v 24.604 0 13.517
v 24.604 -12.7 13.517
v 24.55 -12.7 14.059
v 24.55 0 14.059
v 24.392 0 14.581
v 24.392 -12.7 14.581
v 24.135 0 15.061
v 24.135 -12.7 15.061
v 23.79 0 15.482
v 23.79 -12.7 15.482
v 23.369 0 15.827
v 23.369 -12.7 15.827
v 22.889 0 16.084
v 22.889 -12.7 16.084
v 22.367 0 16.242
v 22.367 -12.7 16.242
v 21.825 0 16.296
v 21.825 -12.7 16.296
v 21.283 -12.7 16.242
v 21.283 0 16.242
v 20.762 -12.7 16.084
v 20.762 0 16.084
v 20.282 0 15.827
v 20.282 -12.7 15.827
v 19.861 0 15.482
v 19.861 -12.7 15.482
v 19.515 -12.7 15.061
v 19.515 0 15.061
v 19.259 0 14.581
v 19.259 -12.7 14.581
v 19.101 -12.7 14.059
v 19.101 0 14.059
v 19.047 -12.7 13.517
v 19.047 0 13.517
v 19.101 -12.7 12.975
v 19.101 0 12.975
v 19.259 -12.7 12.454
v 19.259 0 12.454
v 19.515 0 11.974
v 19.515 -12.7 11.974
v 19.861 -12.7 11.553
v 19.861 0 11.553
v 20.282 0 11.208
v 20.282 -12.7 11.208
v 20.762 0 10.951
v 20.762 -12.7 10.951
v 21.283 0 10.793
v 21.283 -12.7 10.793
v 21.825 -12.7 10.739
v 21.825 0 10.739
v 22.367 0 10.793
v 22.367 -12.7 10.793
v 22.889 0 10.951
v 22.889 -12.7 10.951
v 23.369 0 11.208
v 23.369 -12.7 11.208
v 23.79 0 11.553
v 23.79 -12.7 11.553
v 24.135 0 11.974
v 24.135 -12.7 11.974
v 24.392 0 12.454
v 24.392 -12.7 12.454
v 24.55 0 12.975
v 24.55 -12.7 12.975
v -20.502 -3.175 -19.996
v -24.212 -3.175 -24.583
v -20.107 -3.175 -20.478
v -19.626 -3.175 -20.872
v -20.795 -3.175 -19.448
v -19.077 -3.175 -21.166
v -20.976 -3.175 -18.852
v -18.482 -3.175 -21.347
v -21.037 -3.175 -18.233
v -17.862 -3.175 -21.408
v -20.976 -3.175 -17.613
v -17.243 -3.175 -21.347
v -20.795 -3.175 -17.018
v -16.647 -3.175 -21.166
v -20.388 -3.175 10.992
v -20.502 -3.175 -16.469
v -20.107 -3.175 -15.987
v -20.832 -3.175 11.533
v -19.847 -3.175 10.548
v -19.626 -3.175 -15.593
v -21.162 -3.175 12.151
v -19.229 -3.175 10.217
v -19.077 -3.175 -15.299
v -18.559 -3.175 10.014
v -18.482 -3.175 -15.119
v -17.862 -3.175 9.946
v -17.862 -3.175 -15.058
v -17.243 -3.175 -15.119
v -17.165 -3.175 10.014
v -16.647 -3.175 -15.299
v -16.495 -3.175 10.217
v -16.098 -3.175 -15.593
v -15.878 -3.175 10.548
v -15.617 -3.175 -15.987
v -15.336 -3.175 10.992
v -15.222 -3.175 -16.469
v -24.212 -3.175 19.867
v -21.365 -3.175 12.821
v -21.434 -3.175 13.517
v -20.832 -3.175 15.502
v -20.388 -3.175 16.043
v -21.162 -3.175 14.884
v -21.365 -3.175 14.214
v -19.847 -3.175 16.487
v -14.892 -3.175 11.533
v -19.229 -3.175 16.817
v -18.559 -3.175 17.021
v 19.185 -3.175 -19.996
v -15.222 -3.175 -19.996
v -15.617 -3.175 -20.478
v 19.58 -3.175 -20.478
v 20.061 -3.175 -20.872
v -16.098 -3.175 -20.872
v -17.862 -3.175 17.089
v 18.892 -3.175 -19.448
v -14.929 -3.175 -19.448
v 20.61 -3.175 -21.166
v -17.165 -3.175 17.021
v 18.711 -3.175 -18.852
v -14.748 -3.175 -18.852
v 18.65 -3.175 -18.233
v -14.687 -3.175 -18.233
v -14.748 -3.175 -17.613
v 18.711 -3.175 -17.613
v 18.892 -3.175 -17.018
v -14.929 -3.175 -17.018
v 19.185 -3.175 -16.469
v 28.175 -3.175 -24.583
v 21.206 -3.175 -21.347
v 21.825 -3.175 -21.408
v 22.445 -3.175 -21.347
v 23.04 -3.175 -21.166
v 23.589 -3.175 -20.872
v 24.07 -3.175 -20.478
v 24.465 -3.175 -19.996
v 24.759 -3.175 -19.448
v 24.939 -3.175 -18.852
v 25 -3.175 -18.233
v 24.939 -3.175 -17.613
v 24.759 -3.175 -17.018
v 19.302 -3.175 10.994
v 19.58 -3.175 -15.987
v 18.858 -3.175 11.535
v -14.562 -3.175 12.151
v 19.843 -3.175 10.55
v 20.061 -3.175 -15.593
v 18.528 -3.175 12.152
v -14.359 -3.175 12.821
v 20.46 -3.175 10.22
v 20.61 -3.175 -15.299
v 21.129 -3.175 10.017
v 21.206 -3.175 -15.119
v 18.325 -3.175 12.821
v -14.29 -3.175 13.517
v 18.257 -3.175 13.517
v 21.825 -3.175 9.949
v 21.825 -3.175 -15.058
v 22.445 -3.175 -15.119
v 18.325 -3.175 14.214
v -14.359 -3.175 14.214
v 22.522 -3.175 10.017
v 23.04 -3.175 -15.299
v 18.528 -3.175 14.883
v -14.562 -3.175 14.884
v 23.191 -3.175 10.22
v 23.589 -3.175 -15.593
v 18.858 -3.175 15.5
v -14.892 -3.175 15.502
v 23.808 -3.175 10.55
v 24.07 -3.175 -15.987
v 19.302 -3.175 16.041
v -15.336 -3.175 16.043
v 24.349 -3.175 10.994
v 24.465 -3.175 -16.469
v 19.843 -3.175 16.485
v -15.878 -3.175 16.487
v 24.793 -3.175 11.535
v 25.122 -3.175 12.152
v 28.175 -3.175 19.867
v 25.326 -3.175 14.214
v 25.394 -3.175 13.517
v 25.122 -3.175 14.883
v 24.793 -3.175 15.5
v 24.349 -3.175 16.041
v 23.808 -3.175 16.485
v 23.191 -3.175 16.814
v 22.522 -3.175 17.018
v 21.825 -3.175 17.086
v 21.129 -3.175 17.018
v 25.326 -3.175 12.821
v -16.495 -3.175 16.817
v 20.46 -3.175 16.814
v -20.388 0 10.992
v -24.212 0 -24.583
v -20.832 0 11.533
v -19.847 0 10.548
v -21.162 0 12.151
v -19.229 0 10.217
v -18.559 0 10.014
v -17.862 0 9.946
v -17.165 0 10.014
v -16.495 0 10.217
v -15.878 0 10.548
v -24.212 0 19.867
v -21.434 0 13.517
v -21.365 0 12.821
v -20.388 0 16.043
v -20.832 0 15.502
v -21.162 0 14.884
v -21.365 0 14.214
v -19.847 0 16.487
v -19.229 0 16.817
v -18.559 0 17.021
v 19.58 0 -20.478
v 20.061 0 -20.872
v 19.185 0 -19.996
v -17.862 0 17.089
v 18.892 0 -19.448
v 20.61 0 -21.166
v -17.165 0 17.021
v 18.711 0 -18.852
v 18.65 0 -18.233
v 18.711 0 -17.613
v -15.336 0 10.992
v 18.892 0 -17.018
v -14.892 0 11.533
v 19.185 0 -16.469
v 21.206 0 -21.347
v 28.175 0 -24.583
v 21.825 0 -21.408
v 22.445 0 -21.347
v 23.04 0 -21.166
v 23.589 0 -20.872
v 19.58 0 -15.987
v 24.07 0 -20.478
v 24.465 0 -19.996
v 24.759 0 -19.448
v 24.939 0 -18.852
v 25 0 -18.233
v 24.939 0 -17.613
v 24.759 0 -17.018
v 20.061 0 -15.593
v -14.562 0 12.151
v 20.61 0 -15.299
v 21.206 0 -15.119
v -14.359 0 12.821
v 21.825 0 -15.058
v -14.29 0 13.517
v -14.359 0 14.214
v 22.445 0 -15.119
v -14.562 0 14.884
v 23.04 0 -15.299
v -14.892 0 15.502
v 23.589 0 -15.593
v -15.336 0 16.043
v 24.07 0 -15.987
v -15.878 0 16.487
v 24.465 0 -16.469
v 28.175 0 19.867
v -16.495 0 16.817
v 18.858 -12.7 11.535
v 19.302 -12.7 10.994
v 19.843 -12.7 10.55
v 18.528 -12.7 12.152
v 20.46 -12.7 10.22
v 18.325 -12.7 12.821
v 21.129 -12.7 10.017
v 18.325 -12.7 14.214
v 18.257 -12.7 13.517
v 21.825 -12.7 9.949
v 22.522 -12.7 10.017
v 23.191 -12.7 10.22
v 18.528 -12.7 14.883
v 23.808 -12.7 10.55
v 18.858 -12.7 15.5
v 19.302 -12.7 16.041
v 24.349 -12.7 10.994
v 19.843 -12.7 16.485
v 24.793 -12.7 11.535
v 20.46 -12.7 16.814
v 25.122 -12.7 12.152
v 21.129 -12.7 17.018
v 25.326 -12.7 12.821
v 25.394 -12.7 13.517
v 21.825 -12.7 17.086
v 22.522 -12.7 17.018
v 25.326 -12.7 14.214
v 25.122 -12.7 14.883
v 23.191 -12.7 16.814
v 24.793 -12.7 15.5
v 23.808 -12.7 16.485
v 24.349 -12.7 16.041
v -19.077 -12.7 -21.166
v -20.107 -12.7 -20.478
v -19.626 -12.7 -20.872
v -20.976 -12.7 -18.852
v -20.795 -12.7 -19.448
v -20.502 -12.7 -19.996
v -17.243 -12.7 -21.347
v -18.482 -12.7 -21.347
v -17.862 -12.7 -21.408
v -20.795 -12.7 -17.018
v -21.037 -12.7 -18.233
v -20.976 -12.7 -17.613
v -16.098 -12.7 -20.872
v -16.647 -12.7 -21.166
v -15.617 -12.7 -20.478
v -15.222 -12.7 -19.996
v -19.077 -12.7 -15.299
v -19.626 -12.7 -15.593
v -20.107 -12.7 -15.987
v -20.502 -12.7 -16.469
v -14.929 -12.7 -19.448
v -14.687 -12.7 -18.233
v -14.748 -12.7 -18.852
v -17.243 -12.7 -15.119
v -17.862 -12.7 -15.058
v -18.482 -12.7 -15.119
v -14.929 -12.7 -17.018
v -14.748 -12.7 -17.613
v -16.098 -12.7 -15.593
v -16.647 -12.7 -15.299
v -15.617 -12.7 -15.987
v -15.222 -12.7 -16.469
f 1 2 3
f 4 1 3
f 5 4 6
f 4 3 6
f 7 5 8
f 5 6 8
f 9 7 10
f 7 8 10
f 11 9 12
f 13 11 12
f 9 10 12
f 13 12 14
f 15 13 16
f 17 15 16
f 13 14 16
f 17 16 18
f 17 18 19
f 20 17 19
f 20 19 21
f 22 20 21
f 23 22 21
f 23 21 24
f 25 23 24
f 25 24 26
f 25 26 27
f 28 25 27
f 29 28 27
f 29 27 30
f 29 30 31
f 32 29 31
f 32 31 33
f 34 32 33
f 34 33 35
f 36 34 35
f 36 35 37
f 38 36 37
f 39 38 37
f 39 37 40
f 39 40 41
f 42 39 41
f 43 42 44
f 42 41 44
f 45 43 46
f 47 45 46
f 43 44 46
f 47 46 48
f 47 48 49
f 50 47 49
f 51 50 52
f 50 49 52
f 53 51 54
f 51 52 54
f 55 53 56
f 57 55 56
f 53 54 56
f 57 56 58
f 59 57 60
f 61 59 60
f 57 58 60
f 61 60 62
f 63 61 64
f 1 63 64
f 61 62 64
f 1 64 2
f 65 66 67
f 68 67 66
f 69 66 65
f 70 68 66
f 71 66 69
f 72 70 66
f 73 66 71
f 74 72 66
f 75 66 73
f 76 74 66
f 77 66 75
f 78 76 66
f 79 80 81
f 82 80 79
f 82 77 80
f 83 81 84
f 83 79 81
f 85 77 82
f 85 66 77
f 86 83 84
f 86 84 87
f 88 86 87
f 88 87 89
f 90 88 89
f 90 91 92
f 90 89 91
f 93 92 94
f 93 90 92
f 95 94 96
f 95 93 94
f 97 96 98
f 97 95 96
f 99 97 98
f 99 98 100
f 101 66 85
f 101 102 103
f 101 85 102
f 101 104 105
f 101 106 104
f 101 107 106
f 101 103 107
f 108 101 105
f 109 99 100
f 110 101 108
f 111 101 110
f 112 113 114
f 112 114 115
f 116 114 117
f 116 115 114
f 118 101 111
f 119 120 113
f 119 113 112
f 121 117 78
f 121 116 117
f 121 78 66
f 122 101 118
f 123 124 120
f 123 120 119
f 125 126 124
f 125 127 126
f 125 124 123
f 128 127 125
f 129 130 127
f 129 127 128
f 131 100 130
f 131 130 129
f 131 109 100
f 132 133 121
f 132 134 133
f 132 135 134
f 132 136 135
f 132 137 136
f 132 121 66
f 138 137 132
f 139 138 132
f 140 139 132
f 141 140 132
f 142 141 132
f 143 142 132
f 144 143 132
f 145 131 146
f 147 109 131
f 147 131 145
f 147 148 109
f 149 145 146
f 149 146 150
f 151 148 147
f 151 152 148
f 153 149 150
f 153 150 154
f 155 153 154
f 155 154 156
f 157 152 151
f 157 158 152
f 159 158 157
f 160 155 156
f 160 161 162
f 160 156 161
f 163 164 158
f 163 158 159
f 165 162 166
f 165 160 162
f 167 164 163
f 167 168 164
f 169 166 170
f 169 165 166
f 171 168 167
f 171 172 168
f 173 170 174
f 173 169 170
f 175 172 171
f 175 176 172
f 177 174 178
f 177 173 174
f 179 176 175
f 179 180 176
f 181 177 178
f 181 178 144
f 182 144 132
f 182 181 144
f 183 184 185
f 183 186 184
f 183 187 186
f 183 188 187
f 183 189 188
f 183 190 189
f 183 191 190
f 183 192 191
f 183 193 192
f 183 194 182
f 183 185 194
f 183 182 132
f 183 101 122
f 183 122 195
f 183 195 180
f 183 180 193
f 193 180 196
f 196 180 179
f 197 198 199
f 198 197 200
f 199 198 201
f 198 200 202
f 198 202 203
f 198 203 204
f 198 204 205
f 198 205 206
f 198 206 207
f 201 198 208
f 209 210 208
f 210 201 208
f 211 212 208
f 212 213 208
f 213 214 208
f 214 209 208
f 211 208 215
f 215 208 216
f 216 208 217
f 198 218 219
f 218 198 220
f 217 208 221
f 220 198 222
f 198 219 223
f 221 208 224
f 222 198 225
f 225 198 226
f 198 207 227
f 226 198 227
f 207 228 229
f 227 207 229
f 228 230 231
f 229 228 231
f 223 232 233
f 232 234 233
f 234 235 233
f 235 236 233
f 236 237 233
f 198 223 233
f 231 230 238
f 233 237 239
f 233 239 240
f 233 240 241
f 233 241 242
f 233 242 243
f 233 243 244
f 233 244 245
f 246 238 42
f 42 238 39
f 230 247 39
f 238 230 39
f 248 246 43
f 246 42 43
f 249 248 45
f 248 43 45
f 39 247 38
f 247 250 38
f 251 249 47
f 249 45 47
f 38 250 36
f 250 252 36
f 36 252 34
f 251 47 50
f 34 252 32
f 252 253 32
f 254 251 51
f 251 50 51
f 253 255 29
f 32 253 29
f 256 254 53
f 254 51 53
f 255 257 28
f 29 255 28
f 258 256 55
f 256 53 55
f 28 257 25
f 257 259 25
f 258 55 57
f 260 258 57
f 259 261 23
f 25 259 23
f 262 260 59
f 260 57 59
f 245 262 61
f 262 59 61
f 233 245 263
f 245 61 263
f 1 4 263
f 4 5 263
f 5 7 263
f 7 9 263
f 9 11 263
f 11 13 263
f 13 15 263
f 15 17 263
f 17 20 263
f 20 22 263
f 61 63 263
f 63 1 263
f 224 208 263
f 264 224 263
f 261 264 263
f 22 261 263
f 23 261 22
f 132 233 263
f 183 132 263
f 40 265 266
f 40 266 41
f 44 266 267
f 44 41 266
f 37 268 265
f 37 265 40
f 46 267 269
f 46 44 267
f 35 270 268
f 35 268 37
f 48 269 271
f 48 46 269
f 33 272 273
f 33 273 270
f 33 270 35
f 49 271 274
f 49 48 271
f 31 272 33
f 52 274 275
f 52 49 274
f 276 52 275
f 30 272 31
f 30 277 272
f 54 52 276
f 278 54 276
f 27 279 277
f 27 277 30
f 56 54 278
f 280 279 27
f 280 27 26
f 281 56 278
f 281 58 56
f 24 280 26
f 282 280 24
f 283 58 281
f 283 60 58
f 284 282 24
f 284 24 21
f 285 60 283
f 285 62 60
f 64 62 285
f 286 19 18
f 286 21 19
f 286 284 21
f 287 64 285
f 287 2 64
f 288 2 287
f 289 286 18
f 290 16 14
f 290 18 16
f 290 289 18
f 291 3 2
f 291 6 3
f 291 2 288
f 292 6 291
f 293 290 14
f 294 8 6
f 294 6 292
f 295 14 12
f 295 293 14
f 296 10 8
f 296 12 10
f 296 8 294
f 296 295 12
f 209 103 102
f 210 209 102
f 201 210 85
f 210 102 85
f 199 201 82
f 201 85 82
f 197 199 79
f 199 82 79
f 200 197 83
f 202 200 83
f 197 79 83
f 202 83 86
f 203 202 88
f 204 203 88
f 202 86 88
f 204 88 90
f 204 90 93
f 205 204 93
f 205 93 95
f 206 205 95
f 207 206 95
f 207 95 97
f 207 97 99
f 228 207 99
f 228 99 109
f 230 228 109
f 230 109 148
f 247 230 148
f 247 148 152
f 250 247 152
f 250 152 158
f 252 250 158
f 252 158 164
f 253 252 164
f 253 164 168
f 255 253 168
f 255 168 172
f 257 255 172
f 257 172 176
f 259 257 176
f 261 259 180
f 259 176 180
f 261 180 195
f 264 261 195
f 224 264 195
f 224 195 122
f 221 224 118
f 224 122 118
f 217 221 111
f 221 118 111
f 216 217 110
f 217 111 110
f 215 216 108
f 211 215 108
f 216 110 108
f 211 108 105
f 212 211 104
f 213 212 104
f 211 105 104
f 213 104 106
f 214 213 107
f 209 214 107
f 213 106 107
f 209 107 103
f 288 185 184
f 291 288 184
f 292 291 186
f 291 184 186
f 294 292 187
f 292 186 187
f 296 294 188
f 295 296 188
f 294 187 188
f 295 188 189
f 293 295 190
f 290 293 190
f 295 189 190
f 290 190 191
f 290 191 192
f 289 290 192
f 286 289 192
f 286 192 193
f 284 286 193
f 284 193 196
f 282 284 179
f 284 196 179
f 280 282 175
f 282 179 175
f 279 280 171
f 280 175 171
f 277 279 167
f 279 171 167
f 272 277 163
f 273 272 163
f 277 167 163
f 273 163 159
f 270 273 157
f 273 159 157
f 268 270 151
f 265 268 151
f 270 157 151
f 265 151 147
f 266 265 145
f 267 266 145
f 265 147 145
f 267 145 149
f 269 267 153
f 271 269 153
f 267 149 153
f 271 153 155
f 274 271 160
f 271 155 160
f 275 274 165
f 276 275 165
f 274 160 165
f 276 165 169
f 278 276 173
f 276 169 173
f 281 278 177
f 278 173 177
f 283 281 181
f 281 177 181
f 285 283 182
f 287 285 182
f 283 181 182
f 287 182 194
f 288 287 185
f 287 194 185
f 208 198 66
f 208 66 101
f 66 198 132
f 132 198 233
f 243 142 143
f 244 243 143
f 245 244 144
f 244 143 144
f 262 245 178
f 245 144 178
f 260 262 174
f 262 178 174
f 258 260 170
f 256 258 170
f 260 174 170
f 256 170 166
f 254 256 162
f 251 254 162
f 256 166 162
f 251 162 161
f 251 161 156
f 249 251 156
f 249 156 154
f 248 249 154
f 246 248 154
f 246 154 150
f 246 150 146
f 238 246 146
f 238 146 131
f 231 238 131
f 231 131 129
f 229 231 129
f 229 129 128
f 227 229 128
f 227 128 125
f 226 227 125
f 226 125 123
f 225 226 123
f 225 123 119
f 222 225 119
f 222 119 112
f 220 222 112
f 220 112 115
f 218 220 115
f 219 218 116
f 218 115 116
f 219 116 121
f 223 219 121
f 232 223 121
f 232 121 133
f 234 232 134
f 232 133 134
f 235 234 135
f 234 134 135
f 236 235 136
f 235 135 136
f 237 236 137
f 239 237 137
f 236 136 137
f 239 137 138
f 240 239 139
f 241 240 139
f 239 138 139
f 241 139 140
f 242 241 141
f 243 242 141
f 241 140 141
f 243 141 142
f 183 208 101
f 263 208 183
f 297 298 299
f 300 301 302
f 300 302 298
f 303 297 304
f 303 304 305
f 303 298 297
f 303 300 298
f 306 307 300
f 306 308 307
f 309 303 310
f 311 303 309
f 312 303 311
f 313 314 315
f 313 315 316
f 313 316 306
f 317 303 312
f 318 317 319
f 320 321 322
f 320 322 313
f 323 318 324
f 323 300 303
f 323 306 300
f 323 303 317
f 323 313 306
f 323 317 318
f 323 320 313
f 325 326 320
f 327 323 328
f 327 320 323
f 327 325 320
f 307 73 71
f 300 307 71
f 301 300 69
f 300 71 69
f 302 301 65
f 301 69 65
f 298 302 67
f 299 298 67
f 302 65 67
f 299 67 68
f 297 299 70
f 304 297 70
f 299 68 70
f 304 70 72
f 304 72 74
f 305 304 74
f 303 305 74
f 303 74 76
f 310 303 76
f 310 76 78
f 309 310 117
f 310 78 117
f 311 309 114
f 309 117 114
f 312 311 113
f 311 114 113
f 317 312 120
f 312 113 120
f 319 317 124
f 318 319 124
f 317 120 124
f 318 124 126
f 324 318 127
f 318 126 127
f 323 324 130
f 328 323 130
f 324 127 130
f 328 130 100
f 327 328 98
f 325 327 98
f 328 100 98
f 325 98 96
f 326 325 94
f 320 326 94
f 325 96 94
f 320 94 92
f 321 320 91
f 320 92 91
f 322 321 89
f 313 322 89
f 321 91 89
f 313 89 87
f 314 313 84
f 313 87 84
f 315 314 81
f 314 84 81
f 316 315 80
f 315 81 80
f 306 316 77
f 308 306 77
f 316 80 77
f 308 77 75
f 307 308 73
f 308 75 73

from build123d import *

# Parameters (mm, degrees)
F0_W      = 52.3875
F0_H      = 44.45
F1_DEPTH  = 3.175
F3_DEPTH  = 3.176
F4_R      = 3.5687
F5_DEPTH  = 9.525
F6_R      = 2.778125
F7_DEPTH  = 12.701
F9_DEPTH  = 9.525
F10_R     = 3.175
F11_DEPTH = 3.176


with BuildPart() as f1:
    # F0 (on Front) → F1 (new body)
    with BuildSketch(Plane.XZ):
        with Locations((1.981661, -2.357554)):
            Rectangle(F0_W, F0_H)
    extrude(amount=F1_DEPTH)

    # F2 (on face) → F3 (cut, through all)
    with BuildSketch(Plane.XZ.offset(3.175)):
        with BuildLine():
            ThreePointArc((-14.290214, 13.517446), (-17.862089, 17.089321), (-21.433964, 13.517446))
            ThreePointArc((-21.433964, 13.517446), (-17.862089, 9.945571), (-14.290214, 13.517446))
        make_face()
    extrude(amount=-F3_DEPTH, mode=Mode.SUBTRACT)

    # F4 (on face) → F5 (join)
    with BuildSketch(Plane.XZ.offset(3.175)):
        with Locations((21.825411, 13.517446)):
            Circle(F4_R)
    extrude(amount=F5_DEPTH)

    # F6 (on face) → F7 (cut, through all)
    with BuildSketch(Plane.XZ.offset(12.7)):
        with Locations((21.825411, 13.517446)):
            Circle(F6_R)
    extrude(amount=-F7_DEPTH, mode=Mode.SUBTRACT)

    # F8 (on face) → F9 (join)
    with BuildSketch(Plane.XZ.offset(3.175)):
        with BuildLine():
            ThreePointArc((-14.687089, -18.232554), (-17.862089, -15.057554), (-21.037089, -18.232554))
            ThreePointArc((-21.037089, -18.232554), (-17.862089, -21.407554), (-14.687089, -18.232554))
        make_face()
    extrude(amount=F9_DEPTH)

    # F10 (on face) → F11 (cut, through all)
    with BuildSketch(Plane.XZ.offset(3.175)):
        with Locations((21.825411, -18.232554)):
            Circle(F10_R)
    extrude(amount=-F11_DEPTH, mode=Mode.SUBTRACT)


solid = f1.part
